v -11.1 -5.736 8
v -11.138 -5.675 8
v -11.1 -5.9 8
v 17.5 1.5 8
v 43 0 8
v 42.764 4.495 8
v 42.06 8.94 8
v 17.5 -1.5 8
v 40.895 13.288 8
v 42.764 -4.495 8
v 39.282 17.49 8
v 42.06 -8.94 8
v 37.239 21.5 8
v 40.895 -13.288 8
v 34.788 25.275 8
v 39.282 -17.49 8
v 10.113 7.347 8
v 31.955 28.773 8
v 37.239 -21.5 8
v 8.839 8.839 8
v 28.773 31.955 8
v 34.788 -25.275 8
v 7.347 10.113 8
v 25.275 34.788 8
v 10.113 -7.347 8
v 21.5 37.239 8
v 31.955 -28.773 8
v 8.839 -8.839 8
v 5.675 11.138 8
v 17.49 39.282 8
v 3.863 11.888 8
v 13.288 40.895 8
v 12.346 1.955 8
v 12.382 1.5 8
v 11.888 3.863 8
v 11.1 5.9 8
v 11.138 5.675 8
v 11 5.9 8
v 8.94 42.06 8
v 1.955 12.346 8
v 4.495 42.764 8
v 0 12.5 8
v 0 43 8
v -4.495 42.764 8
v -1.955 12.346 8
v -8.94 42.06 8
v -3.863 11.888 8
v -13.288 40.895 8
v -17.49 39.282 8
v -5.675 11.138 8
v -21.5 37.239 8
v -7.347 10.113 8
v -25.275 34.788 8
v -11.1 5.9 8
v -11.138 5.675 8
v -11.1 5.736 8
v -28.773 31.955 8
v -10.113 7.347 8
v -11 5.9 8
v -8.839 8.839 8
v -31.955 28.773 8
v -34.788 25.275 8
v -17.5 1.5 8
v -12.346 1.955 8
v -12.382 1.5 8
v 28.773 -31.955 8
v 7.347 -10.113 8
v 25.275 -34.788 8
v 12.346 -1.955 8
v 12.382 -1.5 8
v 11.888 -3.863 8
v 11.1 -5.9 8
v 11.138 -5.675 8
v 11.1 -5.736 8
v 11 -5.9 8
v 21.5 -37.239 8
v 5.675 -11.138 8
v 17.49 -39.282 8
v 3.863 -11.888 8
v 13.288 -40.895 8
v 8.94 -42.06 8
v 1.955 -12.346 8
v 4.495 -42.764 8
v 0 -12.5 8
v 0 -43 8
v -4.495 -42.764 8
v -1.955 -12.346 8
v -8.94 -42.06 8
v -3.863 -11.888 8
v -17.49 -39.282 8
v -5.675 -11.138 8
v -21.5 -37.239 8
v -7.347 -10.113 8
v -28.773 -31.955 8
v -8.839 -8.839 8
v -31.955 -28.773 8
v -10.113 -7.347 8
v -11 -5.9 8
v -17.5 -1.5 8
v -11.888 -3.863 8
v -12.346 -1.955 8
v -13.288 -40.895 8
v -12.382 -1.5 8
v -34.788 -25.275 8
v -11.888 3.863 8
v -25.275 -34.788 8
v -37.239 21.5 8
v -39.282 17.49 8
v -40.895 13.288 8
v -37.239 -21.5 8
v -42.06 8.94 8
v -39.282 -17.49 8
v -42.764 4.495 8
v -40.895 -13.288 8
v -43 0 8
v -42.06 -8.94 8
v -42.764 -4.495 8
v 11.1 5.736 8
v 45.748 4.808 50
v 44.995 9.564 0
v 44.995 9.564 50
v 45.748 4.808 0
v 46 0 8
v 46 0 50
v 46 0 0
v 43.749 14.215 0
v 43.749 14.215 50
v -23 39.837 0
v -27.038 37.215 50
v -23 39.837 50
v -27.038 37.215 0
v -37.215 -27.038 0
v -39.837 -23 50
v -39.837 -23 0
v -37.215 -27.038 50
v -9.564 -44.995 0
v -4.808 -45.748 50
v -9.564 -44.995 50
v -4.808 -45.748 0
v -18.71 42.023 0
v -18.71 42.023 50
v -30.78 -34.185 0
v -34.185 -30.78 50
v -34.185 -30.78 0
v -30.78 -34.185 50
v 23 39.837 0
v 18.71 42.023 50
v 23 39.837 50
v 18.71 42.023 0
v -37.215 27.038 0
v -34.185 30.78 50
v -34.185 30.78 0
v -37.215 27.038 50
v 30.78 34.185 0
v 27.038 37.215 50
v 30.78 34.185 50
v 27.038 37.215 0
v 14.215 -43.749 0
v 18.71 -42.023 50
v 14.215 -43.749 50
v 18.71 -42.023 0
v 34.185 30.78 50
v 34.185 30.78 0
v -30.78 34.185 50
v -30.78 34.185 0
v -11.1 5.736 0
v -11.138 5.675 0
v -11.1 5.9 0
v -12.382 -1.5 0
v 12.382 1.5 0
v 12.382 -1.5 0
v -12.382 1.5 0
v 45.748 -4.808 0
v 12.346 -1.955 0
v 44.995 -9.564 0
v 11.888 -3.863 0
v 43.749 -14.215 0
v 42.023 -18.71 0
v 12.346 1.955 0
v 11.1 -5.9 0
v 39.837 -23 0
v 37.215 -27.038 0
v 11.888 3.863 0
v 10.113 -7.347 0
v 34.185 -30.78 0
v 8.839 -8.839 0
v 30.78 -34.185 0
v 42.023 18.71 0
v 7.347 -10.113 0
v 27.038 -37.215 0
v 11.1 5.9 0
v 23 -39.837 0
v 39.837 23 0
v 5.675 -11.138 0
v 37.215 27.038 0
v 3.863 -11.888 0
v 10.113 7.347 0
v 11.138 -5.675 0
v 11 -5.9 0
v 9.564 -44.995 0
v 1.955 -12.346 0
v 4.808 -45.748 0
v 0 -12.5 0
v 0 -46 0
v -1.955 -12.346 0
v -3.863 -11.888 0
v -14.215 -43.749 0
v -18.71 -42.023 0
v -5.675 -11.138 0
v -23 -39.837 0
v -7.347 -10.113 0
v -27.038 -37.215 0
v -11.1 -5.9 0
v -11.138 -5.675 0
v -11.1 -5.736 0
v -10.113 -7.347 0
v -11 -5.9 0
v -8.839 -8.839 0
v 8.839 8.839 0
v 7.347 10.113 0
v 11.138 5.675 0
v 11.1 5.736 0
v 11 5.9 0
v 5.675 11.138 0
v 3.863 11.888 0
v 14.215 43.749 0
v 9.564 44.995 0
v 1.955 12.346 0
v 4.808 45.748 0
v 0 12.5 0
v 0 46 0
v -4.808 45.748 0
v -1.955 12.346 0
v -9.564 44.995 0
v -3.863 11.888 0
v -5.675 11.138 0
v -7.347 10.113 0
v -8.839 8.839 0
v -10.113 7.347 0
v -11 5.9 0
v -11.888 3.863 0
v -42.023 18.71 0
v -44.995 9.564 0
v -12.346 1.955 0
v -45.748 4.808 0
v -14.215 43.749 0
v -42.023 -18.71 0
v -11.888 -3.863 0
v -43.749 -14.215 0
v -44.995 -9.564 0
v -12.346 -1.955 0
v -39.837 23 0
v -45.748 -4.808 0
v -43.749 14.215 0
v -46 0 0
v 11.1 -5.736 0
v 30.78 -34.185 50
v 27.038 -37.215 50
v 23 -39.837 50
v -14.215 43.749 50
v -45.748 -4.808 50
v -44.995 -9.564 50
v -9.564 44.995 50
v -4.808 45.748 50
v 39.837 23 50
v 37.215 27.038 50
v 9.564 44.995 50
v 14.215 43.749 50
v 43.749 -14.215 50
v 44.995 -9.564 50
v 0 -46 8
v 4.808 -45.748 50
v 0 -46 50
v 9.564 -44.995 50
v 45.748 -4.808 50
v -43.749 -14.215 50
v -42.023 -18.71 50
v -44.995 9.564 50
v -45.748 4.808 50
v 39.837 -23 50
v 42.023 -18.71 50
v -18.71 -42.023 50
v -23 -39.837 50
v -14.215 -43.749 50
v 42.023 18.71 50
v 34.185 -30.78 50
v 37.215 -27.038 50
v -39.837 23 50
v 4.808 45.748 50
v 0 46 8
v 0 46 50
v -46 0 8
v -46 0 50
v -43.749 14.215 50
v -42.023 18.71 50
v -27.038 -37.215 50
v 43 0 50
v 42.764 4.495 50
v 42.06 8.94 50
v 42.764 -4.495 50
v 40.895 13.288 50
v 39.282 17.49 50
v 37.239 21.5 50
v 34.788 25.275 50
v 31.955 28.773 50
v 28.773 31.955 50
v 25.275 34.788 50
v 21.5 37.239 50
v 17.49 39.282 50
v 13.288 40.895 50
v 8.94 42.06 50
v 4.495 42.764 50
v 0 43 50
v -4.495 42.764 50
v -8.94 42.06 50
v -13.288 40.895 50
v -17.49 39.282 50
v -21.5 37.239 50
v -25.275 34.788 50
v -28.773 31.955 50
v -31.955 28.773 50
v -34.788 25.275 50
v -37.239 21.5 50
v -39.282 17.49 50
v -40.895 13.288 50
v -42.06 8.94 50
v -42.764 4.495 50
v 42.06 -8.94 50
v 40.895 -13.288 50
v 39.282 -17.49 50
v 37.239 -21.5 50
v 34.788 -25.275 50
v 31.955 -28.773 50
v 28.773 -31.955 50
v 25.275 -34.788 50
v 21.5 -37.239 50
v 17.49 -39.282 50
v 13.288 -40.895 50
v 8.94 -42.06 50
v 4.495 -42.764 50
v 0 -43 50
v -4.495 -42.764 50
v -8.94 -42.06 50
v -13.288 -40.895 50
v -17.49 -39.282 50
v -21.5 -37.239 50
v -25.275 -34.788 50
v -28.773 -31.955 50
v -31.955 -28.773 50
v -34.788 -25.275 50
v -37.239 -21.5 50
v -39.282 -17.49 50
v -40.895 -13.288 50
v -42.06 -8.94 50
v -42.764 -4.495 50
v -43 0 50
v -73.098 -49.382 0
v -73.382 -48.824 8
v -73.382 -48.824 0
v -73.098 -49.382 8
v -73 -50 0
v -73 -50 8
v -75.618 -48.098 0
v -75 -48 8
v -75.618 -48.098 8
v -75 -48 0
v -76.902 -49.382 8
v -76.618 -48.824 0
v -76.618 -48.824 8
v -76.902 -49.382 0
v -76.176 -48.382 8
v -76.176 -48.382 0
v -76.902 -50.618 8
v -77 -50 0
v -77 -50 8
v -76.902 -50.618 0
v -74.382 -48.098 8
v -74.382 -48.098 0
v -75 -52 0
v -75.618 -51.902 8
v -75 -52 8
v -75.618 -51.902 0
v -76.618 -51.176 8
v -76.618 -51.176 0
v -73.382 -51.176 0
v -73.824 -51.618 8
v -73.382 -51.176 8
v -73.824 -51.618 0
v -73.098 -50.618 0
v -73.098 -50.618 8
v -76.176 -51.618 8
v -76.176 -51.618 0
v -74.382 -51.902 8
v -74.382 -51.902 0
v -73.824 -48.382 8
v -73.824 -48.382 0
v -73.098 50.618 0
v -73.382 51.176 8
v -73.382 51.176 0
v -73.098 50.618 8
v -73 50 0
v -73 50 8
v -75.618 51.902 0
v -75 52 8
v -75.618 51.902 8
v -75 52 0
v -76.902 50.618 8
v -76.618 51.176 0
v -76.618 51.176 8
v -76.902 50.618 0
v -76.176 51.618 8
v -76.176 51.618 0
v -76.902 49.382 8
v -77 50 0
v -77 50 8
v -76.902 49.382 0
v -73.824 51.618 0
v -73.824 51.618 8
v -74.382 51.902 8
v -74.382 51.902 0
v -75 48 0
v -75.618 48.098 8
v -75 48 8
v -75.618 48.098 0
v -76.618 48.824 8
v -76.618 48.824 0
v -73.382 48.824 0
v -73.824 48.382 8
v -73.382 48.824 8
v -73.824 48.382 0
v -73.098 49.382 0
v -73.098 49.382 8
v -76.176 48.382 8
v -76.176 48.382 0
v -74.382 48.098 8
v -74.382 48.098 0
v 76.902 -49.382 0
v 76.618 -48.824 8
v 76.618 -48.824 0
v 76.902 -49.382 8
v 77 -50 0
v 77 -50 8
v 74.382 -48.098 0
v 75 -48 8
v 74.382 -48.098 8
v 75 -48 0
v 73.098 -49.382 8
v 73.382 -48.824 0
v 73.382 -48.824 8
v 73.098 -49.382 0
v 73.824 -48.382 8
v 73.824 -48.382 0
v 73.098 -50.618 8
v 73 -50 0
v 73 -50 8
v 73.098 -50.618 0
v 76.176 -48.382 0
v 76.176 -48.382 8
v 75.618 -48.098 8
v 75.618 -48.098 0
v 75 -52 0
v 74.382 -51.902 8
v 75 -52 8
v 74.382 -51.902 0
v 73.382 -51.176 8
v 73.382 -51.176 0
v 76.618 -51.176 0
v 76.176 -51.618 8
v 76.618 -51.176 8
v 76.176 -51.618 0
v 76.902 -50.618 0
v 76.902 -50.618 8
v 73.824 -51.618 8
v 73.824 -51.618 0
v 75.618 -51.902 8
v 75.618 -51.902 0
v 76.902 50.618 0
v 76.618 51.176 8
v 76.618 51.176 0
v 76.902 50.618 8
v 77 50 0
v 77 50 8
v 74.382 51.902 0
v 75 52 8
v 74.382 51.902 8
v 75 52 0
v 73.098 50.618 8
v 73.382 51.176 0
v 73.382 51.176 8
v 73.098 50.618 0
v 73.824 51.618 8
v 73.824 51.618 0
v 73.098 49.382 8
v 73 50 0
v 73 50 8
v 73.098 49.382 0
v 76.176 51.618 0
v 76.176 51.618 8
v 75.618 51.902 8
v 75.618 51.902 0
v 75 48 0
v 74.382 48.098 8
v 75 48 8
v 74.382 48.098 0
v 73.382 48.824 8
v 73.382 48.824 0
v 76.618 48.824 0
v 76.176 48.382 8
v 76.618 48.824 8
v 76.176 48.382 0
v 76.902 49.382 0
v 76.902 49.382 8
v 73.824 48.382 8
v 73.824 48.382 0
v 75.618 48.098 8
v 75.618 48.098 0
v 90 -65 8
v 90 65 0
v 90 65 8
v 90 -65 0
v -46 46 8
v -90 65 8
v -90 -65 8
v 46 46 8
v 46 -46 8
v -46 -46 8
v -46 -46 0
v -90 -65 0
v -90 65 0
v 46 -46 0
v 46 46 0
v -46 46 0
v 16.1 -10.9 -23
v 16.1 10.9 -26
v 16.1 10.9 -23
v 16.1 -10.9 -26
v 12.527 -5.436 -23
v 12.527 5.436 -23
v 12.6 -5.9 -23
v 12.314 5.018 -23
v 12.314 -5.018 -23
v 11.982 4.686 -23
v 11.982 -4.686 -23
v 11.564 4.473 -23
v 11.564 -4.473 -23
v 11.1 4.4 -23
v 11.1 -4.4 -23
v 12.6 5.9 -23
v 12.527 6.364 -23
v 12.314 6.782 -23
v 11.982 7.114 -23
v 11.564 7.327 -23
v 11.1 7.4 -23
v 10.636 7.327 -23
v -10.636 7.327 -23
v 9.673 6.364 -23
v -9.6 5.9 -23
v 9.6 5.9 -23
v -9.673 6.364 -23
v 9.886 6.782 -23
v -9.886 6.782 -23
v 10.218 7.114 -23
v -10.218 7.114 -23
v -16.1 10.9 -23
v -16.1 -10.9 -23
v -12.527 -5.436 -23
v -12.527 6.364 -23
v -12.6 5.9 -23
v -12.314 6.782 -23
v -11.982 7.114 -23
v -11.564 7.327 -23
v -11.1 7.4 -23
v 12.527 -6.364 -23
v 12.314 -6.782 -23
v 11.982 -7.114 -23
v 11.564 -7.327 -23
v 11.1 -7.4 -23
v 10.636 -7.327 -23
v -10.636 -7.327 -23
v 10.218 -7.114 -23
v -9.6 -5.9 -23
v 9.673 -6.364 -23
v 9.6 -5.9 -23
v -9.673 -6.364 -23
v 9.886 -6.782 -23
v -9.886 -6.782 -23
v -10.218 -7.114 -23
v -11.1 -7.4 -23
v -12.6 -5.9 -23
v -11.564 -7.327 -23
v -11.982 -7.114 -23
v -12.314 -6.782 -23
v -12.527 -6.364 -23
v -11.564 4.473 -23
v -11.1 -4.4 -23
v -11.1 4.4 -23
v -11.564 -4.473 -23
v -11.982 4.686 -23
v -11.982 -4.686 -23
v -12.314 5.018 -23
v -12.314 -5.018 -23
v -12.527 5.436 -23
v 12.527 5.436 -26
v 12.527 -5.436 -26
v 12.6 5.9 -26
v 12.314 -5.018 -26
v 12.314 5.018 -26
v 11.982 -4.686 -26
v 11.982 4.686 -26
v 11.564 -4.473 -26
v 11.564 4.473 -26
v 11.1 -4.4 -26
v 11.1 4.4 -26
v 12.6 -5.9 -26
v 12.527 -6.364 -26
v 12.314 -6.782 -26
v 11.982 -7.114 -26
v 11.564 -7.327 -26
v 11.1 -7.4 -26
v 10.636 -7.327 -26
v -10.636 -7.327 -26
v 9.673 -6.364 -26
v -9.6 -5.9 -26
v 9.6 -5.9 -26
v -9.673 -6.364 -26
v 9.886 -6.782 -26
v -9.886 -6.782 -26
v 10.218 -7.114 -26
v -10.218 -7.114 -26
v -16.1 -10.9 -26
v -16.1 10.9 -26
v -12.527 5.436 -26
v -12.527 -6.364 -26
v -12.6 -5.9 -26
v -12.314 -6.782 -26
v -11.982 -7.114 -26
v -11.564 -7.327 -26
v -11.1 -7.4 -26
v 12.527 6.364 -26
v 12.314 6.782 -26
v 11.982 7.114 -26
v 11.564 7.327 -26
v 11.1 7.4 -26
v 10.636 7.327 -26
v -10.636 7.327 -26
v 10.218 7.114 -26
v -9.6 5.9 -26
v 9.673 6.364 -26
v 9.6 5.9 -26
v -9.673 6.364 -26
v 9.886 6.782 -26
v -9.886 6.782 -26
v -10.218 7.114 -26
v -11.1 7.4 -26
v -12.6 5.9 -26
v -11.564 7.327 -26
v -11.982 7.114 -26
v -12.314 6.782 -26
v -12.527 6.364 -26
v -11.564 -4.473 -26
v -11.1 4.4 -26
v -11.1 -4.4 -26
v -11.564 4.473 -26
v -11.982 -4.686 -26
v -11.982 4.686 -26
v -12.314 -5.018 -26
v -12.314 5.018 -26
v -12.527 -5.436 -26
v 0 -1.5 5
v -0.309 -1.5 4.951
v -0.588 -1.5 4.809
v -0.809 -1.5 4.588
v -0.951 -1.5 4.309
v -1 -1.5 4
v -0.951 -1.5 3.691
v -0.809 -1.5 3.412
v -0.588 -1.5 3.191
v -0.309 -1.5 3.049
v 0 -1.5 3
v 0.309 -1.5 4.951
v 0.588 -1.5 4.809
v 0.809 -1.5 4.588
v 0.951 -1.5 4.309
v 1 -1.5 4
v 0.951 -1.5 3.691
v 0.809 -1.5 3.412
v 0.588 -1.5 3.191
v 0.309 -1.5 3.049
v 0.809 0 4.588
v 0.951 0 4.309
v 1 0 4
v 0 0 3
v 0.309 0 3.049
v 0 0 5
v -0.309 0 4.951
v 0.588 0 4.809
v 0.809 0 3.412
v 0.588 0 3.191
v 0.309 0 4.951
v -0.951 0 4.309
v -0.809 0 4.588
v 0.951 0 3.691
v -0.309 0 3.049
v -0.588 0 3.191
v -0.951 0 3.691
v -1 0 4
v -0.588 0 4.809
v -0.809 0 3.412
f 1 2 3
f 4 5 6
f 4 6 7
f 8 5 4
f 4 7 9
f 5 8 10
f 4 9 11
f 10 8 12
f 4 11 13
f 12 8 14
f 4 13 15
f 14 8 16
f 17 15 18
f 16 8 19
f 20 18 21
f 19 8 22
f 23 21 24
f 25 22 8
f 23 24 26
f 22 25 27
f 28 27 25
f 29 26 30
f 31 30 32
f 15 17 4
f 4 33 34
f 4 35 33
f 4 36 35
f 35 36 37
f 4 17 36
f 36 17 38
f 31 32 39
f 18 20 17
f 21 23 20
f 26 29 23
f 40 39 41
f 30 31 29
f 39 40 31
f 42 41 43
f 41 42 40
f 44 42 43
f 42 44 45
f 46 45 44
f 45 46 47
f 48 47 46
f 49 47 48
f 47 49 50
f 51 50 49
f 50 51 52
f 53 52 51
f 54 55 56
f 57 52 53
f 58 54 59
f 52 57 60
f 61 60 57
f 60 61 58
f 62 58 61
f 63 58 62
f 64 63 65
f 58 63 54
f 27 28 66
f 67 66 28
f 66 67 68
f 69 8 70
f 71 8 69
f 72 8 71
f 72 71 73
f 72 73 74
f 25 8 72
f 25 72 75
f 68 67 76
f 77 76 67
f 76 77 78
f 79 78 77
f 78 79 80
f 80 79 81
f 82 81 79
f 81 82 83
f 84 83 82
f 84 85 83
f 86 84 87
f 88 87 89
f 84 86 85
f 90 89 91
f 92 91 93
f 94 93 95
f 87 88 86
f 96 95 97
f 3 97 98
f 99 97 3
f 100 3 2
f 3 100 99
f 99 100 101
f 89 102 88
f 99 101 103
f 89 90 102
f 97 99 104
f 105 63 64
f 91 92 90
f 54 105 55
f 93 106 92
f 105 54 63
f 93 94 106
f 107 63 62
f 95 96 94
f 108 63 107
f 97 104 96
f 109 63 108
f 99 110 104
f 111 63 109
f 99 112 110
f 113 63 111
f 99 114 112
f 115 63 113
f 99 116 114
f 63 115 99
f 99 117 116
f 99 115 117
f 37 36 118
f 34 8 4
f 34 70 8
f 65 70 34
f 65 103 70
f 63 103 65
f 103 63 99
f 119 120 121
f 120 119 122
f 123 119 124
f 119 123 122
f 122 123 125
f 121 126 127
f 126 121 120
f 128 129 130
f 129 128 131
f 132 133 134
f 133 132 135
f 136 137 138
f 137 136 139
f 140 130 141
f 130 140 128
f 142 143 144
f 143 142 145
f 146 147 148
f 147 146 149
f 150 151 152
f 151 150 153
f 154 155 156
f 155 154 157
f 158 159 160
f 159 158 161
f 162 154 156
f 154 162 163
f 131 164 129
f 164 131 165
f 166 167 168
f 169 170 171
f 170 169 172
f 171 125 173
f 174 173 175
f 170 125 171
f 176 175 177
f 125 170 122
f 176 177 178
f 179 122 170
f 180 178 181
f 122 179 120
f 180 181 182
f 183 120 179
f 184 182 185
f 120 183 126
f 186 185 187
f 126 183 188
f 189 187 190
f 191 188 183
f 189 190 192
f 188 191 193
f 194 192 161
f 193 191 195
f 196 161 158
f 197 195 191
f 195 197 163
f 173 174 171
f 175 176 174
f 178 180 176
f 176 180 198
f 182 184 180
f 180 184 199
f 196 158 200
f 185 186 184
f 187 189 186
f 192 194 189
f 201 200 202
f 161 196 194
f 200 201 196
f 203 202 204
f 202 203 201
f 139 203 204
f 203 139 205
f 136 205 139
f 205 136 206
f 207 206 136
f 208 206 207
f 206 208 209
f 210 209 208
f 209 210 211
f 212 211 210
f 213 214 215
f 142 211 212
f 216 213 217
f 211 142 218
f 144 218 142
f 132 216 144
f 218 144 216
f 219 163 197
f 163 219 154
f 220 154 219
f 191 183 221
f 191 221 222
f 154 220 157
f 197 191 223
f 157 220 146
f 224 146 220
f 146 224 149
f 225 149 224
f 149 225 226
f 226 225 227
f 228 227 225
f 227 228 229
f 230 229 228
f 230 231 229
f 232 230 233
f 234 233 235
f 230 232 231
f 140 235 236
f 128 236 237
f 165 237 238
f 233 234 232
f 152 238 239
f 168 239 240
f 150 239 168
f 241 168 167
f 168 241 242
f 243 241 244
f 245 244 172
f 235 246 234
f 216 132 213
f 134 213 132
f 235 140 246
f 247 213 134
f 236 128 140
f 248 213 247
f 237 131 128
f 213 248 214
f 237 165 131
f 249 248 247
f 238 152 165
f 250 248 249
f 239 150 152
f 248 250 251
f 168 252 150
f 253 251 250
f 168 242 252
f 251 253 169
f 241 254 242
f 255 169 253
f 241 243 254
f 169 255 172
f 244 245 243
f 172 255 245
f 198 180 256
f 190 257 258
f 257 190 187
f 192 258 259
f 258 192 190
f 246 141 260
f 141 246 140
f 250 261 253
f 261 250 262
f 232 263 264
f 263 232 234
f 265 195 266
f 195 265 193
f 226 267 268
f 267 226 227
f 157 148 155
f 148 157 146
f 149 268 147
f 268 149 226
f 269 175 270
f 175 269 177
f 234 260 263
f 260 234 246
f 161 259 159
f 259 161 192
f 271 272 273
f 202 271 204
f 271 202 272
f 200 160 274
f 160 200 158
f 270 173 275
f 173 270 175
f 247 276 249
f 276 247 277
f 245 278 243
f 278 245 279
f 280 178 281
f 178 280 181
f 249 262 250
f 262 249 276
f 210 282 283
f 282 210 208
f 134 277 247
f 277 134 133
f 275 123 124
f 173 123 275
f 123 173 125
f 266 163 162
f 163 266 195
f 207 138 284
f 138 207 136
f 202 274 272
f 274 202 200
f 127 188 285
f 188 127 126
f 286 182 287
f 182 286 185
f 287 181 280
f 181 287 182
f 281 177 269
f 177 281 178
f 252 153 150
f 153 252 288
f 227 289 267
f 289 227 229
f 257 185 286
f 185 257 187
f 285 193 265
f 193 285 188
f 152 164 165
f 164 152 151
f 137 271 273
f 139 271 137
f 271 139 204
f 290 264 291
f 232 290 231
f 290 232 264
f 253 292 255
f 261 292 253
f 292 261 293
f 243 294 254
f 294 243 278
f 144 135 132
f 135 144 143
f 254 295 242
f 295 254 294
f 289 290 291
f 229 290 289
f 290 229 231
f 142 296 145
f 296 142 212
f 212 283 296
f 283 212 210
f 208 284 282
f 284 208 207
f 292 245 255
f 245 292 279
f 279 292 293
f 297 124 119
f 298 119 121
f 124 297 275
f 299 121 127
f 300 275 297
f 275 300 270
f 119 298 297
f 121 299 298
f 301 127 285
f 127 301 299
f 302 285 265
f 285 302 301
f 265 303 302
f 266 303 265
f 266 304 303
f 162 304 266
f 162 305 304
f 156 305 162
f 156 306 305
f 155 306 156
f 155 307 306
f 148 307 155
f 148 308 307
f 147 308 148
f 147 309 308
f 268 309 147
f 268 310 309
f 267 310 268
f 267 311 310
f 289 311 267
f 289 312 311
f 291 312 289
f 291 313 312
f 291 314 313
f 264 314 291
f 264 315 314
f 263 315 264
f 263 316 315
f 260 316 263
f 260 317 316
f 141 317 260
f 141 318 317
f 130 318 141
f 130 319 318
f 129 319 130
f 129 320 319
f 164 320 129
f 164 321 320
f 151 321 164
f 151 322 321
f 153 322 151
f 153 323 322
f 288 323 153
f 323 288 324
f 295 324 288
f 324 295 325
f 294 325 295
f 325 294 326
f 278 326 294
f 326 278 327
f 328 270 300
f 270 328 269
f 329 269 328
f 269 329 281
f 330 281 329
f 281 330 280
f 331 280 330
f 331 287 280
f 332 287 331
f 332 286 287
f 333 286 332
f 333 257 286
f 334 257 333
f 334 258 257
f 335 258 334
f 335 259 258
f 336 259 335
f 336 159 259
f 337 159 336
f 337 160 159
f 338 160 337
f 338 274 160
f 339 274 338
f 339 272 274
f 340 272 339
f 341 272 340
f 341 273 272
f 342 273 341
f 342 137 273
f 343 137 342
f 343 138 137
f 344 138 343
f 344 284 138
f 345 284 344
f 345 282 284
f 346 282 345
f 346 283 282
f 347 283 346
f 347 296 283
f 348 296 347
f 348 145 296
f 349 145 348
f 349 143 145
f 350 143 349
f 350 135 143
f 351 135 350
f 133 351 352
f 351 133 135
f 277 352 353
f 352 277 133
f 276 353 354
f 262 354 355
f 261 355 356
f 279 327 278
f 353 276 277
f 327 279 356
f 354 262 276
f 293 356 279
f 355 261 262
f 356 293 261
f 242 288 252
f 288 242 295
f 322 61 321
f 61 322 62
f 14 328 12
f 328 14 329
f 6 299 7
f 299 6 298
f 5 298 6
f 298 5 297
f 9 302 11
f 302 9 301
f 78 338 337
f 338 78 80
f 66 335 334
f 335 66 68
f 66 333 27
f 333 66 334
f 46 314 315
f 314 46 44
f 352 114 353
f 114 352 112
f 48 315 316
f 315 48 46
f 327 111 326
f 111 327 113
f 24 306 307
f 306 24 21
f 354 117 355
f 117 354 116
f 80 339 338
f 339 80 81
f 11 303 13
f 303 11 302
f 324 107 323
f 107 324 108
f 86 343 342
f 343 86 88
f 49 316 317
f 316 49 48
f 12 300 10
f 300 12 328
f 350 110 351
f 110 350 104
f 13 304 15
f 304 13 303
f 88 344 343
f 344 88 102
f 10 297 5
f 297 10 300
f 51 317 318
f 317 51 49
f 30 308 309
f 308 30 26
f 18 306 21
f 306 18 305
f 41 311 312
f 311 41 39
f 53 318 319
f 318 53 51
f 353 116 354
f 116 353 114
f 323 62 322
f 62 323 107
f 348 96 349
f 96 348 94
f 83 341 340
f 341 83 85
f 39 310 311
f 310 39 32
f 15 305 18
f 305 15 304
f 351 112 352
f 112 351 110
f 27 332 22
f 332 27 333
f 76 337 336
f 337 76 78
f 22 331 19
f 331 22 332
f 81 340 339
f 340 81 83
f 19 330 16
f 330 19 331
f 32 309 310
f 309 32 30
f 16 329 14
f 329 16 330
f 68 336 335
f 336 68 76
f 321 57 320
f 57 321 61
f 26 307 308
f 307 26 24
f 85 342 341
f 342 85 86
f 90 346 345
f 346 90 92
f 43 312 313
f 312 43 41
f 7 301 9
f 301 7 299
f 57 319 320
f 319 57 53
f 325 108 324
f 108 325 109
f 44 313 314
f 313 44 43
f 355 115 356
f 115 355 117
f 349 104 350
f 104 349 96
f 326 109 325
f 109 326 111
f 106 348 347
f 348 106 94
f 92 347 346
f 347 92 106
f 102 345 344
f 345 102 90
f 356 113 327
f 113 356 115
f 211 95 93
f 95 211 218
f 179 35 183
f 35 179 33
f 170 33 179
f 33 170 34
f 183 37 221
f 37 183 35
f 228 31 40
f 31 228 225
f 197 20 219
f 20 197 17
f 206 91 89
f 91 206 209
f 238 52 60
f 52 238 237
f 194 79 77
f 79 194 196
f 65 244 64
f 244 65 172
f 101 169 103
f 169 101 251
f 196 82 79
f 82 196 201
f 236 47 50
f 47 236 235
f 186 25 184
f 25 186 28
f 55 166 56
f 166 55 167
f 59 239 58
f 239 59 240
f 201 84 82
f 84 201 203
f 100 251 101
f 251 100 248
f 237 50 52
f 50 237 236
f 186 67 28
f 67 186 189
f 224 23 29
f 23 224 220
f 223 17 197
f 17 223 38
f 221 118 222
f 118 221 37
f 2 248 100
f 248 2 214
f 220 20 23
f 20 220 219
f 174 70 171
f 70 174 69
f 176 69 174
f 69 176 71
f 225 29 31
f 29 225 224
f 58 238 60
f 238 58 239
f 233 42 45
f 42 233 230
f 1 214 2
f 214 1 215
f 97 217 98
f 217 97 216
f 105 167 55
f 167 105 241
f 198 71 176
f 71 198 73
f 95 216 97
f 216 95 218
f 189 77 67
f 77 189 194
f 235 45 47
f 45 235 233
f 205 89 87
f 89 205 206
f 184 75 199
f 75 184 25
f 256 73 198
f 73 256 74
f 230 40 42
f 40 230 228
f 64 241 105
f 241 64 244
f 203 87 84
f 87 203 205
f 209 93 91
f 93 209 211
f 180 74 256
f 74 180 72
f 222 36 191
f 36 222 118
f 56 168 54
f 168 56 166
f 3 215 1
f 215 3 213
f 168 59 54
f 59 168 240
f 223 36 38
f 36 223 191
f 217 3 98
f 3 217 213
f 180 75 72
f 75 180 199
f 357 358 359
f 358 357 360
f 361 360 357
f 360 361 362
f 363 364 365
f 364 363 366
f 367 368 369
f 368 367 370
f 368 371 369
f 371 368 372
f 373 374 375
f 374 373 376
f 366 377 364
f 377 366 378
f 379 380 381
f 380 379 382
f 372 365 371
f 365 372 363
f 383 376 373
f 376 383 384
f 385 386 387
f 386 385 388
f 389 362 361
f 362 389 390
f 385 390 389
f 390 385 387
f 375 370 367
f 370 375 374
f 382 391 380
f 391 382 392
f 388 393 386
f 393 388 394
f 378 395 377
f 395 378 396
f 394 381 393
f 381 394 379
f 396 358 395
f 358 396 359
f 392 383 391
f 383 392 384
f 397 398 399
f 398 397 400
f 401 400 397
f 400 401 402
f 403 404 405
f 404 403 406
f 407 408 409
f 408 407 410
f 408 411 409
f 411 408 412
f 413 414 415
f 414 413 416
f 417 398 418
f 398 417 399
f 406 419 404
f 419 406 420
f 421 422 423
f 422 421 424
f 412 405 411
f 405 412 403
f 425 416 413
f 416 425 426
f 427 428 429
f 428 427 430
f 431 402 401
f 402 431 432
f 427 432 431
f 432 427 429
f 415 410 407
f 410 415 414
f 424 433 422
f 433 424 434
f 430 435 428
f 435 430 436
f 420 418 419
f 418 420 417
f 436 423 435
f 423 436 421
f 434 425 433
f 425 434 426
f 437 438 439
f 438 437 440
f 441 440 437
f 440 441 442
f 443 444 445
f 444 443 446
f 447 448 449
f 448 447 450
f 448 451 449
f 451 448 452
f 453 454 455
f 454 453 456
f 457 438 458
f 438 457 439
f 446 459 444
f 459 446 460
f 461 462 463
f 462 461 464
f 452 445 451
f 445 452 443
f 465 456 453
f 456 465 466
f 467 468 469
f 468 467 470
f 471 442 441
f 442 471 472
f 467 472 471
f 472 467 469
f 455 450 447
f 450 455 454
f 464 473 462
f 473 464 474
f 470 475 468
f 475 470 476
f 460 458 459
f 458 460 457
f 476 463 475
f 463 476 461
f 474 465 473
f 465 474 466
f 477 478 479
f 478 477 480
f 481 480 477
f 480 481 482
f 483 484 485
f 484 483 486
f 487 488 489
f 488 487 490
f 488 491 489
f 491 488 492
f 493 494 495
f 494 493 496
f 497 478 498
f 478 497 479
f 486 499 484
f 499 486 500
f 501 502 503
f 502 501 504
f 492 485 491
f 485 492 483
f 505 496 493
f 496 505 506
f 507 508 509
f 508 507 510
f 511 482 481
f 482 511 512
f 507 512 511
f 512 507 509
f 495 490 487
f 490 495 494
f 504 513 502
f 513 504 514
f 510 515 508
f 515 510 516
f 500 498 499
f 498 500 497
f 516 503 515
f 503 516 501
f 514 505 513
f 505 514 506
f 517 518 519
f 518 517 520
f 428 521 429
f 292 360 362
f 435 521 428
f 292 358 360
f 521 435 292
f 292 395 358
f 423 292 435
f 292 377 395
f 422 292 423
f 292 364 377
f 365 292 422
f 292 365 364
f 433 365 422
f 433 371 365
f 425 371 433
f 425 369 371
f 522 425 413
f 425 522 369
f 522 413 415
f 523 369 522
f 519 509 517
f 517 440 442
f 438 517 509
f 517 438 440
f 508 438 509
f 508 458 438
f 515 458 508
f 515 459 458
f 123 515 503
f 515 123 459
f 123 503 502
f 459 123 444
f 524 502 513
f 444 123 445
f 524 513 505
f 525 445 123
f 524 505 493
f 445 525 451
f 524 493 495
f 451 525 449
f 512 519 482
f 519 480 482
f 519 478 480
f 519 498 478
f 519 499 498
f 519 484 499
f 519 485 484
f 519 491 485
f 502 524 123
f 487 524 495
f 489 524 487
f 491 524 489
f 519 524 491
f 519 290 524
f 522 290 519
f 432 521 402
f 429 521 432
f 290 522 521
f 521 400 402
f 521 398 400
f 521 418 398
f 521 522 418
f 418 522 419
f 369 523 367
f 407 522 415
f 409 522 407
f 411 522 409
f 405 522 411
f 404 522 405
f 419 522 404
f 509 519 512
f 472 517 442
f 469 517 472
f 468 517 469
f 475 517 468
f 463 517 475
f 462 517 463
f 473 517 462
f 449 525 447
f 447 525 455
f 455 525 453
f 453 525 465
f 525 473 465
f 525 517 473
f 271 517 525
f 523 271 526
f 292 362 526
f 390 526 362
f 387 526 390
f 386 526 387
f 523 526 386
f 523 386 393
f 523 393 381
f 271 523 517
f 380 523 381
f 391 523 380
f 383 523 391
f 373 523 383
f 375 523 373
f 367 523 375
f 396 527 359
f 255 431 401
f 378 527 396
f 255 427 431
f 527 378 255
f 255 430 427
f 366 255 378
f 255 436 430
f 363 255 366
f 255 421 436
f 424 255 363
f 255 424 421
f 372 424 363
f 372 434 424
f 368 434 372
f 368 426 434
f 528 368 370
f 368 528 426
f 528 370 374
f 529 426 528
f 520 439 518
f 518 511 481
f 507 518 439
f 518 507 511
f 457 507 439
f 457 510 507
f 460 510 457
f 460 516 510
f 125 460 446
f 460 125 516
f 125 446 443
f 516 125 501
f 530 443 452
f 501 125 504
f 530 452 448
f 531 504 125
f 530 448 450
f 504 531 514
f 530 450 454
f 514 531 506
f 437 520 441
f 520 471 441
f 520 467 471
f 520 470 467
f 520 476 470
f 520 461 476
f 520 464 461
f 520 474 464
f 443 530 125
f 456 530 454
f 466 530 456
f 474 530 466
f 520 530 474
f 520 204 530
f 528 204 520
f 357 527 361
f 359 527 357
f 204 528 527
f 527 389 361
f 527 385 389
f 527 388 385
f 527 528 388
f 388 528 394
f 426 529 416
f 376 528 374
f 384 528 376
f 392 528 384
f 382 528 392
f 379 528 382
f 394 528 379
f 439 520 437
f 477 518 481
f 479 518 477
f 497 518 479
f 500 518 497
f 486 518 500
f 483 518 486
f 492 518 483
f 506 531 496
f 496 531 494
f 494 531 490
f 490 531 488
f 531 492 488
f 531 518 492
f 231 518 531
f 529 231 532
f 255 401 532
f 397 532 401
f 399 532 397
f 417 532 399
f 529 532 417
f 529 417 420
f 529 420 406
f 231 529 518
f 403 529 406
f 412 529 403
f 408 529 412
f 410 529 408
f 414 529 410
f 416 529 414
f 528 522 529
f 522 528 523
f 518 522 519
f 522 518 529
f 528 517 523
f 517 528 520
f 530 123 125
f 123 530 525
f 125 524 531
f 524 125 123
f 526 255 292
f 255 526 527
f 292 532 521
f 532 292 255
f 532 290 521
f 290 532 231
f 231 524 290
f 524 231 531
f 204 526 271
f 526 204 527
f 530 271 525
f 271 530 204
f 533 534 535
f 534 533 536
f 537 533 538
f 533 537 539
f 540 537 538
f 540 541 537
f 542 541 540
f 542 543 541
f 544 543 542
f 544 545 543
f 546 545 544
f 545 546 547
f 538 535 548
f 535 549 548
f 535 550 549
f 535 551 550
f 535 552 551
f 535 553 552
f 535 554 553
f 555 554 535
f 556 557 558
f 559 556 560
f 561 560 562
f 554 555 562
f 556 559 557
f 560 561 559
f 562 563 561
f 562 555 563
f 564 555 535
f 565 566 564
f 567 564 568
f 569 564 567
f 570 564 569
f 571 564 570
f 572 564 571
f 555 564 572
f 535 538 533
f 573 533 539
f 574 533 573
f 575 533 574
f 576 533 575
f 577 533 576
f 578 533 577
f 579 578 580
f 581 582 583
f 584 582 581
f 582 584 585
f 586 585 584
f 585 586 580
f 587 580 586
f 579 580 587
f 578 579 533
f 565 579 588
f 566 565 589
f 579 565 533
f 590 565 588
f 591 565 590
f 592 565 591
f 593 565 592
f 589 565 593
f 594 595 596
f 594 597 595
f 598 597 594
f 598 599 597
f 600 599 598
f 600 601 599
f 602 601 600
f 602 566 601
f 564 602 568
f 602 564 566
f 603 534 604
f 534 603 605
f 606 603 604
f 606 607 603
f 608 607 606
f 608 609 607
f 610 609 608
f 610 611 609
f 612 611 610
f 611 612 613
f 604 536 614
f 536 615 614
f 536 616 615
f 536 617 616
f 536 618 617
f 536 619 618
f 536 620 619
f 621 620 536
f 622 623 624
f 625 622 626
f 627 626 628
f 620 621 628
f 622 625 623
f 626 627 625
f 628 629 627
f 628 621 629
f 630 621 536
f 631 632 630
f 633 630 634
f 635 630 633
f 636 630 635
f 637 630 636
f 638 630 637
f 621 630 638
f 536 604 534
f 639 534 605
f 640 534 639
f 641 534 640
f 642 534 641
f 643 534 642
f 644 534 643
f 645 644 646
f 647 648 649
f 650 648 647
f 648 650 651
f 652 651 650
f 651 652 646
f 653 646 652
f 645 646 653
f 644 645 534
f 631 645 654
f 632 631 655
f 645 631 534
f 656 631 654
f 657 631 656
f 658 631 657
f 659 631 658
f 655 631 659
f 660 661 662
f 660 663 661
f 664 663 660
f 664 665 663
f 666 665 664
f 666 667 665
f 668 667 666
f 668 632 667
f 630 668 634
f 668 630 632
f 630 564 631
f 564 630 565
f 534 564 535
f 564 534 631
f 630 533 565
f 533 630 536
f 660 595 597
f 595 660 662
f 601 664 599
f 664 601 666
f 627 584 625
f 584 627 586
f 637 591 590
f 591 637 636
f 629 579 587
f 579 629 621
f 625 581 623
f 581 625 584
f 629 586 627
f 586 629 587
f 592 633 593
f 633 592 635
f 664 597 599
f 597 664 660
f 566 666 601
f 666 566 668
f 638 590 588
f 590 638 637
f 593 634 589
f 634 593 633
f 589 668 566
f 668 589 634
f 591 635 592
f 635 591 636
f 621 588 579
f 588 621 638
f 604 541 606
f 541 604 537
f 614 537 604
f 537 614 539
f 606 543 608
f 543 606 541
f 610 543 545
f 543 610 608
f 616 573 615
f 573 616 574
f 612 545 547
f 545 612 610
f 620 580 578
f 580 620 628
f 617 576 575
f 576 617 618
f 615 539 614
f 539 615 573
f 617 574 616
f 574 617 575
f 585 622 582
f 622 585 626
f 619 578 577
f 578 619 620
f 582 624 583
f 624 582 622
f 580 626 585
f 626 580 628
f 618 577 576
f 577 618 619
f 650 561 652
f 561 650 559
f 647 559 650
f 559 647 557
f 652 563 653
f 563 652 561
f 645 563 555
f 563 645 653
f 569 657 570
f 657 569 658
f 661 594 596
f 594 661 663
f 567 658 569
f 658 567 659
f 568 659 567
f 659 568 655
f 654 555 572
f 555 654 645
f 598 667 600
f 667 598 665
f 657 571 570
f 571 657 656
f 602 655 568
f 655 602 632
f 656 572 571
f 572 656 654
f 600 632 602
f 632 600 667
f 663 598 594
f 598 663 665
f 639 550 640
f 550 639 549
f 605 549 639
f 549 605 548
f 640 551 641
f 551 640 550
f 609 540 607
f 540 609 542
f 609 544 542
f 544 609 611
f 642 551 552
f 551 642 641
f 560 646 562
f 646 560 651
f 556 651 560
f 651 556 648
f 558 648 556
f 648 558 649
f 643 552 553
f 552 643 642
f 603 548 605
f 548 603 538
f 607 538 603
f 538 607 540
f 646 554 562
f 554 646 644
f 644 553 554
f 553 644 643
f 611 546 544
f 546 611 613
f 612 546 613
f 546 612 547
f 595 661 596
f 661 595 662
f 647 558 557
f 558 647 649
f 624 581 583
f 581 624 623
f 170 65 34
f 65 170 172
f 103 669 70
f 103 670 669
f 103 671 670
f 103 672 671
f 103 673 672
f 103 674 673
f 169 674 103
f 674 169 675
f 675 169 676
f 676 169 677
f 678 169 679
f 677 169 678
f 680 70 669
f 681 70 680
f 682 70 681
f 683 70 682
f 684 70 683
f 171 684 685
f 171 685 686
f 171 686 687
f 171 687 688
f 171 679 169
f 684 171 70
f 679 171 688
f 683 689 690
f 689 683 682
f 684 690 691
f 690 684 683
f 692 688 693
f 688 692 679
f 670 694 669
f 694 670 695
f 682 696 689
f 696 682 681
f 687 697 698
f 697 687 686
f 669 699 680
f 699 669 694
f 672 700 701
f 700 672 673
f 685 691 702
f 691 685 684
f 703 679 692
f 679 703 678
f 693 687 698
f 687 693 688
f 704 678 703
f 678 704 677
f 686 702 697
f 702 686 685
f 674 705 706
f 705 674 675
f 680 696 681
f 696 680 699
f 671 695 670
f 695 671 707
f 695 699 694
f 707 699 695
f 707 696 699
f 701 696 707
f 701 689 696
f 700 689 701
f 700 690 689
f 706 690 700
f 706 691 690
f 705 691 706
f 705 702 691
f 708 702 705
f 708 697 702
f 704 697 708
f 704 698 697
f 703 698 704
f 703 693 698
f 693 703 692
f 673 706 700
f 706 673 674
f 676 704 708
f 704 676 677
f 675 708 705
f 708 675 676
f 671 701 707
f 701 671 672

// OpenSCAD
// Automated Cat Feeder - Mason Jar Adapter
// OpenSCAD file for 3D printing
// Replaces custom hopper with standard mason jar support

// Mason jar thread specifications (Wide Mouth)
jar_thread_diameter = 86.0;  // mm (3.4 inches)
jar_thread_pitch = 2.5;      // mm per thread
jar_thread_height = 8.0;     // mm thread engagement
jar_neck_diameter = 70.0;    // mm neck diameter

// Adapter parameters
adapter_height = 50;         // mm total height
adapter_wall_thickness = 3;  // mm
adapter_flange_height = 8;   // mm mounting flange

// Servo mounting
servo_width = 22.2;
servo_depth = 11.8;
servo_height = 31;
servo_mount_thickness = 3;

// Food outlet
outlet_diameter = 25;        // mm

// Base mounting (matches feeder base)
base_width = 200;
base_depth = 150;

module mason_jar_threads() {
    // Internal threads for mason jar
    difference() {
        // Main thread cylinder
        cylinder(h = jar_thread_height, d = jar_thread_diameter, $fn = 60);
        
        // Thread cutouts
        for (i = [0 : jar_thread_pitch : jar_thread_height]) {
            translate([0, 0, i])
            difference() {
                cylinder(h = jar_thread_pitch, d = jar_thread_diameter + 2, $fn = 60);
                cylinder(h = jar_thread_pitch, d = jar_thread_diameter - 2, $fn = 60);
            }
        }
    }
}

module main_adapter() {
    difference() {
        // Main adapter body
        cylinder(h = adapter_height, d = jar_thread_diameter + 2*adapter_wall_thickness, $fn = 60);
        
        // Internal cavity
        translate([0, 0, adapter_flange_height])
        cylinder(h = adapter_height - adapter_flange_height, d = jar_thread_diameter, $fn = 60);
        
        // Mason jar threads
        translate([0, 0, adapter_flange_height])
        mason_jar_threads();
        
        // Food outlet at bottom
        translate([0, 0, -1])
        cylinder(h = adapter_flange_height + 2, d = outlet_diameter, $fn = 40);
        
        // Servo mounting cutout
        translate([-servo_width/2, -servo_depth/2, adapter_flange_height - servo_height])
        cube([servo_width, servo_depth, servo_height + 1]);
        
        // Ventilation holes around top
        for (angle = [0 : 30 : 330]) {
            rotate([0, 0, angle])
            translate([jar_thread_diameter/2 - 5, 0, adapter_height - 5])
            cylinder(h = 6, d = 4, $fn = 20);
        }
    }
}

module mounting_flange() {
    flange_width = base_width - 20;  // Slightly smaller than base
    flange_depth = base_depth - 20;
    
    translate([-flange_width/2, -flange_depth/2, 0])
    difference() {
        cube([flange_width, flange_depth, adapter_flange_height]);
        
        // Mounting holes (4 corners)
        for (x = [15, flange_width - 15]) {
            for (y = [15, flange_depth - 15]) {
                translate([x, y, -1])
                cylinder(h = adapter_flange_height + 2, d = 4, $fn = 20);
            }
        }
        
        // Center cutout for adapter
        translate([flange_width/2 - jar_thread_diameter/2 - adapter_wall_thickness, 
                   flange_depth/2 - jar_thread_diameter/2 - adapter_wall_thickness, -1])
        cube([jar_thread_diameter + 2*adapter_wall_thickness, 
              jar_thread_diameter + 2*adapter_wall_thickness, 
              adapter_flange_height + 2]);
    }
}

module servo_mount() {
    // Servo mounting bracket
    translate([-servo_width/2 - 5, -servo_depth/2 - 5, adapter_flange_height - servo_height - servo_mount_thickness])
    difference() {
        cube([servo_width + 10, servo_depth + 10, servo_mount_thickness]);
        
        // Servo mounting holes
        translate([5, 5, -1])
        cylinder(h = servo_mount_thickness + 2, d = 3, $fn = 20);
        
        translate([servo_width + 5, 5, -1])
        cylinder(h = servo_mount_thickness + 2, d = 3, $fn = 20);
        
        translate([5, servo_depth + 5, -1])
        cylinder(h = servo_mount_thickness + 2, d = 3, $fn = 20);
        
        translate([servo_width + 5, servo_depth + 5, -1])
        cylinder(h = servo_mount_thickness + 2, d = 3, $fn = 20);
        
        // Servo body cutout
        translate([5, 5, -1])
        cube([servo_width, servo_depth, servo_mount_thickness + 2]);
    }
}

module food_gate() {
    gate_width = outlet_diameter + 10;
    gate_height = 8;
    gate_depth = 3;
    
    // Gate arm
    translate([-gate_width/2, -gate_depth/2, adapter_flange_height - gate_height])
    difference() {
        cube([gate_width, gate_depth, gate_height]);
        
        // Servo arm attachment hole
        translate([gate_width/2, gate_depth/2, gate_height/2])
        rotate([90, 0, 0])
        cylinder(h = gate_depth + 2, d = 2, $fn = 20);
    }
}

module jar_support_ring() {
    // Support ring for jar bottom (optional)
    ring_diameter = jar_thread_diameter + 10;
    ring_height = 5;
    
    translate([0, 0, adapter_height])
    difference() {
        cylinder(h = ring_height, d = ring_diameter, $fn = 60);
        cylinder(h = ring_height, d = jar_thread_diameter - 5, $fn = 60);
    }
}

// Main assembly
main_adapter();
mounting_flange();
servo_mount();
food_gate();

// Uncomment to add jar support ring
// jar_support_ring();

// Optional: Add a mason jar for visualization
module mason_jar() {
    jar_height = 150;
    jar_body_diameter = 95;
    
    color([0.8, 0.8, 0.8])  // Light gray for glass
    translate([0, 0, adapter_height])
    difference() {
        // Jar body
        cylinder(h = jar_height, d = jar_body_diameter, $fn = 60);
        
        // Jar cavity
        translate([0, 0, 5])
        cylinder(h = jar_height - 5, d = jar_body_diameter - 4, $fn = 60);
        
        // Threaded neck
        translate([0, 0, jar_height - jar_thread_height])
        cylinder(h = jar_thread_height, d = jar_thread_diameter, $fn = 60);
    }
}

// Uncomment to visualize with mason jar
// mason_jar(); 
